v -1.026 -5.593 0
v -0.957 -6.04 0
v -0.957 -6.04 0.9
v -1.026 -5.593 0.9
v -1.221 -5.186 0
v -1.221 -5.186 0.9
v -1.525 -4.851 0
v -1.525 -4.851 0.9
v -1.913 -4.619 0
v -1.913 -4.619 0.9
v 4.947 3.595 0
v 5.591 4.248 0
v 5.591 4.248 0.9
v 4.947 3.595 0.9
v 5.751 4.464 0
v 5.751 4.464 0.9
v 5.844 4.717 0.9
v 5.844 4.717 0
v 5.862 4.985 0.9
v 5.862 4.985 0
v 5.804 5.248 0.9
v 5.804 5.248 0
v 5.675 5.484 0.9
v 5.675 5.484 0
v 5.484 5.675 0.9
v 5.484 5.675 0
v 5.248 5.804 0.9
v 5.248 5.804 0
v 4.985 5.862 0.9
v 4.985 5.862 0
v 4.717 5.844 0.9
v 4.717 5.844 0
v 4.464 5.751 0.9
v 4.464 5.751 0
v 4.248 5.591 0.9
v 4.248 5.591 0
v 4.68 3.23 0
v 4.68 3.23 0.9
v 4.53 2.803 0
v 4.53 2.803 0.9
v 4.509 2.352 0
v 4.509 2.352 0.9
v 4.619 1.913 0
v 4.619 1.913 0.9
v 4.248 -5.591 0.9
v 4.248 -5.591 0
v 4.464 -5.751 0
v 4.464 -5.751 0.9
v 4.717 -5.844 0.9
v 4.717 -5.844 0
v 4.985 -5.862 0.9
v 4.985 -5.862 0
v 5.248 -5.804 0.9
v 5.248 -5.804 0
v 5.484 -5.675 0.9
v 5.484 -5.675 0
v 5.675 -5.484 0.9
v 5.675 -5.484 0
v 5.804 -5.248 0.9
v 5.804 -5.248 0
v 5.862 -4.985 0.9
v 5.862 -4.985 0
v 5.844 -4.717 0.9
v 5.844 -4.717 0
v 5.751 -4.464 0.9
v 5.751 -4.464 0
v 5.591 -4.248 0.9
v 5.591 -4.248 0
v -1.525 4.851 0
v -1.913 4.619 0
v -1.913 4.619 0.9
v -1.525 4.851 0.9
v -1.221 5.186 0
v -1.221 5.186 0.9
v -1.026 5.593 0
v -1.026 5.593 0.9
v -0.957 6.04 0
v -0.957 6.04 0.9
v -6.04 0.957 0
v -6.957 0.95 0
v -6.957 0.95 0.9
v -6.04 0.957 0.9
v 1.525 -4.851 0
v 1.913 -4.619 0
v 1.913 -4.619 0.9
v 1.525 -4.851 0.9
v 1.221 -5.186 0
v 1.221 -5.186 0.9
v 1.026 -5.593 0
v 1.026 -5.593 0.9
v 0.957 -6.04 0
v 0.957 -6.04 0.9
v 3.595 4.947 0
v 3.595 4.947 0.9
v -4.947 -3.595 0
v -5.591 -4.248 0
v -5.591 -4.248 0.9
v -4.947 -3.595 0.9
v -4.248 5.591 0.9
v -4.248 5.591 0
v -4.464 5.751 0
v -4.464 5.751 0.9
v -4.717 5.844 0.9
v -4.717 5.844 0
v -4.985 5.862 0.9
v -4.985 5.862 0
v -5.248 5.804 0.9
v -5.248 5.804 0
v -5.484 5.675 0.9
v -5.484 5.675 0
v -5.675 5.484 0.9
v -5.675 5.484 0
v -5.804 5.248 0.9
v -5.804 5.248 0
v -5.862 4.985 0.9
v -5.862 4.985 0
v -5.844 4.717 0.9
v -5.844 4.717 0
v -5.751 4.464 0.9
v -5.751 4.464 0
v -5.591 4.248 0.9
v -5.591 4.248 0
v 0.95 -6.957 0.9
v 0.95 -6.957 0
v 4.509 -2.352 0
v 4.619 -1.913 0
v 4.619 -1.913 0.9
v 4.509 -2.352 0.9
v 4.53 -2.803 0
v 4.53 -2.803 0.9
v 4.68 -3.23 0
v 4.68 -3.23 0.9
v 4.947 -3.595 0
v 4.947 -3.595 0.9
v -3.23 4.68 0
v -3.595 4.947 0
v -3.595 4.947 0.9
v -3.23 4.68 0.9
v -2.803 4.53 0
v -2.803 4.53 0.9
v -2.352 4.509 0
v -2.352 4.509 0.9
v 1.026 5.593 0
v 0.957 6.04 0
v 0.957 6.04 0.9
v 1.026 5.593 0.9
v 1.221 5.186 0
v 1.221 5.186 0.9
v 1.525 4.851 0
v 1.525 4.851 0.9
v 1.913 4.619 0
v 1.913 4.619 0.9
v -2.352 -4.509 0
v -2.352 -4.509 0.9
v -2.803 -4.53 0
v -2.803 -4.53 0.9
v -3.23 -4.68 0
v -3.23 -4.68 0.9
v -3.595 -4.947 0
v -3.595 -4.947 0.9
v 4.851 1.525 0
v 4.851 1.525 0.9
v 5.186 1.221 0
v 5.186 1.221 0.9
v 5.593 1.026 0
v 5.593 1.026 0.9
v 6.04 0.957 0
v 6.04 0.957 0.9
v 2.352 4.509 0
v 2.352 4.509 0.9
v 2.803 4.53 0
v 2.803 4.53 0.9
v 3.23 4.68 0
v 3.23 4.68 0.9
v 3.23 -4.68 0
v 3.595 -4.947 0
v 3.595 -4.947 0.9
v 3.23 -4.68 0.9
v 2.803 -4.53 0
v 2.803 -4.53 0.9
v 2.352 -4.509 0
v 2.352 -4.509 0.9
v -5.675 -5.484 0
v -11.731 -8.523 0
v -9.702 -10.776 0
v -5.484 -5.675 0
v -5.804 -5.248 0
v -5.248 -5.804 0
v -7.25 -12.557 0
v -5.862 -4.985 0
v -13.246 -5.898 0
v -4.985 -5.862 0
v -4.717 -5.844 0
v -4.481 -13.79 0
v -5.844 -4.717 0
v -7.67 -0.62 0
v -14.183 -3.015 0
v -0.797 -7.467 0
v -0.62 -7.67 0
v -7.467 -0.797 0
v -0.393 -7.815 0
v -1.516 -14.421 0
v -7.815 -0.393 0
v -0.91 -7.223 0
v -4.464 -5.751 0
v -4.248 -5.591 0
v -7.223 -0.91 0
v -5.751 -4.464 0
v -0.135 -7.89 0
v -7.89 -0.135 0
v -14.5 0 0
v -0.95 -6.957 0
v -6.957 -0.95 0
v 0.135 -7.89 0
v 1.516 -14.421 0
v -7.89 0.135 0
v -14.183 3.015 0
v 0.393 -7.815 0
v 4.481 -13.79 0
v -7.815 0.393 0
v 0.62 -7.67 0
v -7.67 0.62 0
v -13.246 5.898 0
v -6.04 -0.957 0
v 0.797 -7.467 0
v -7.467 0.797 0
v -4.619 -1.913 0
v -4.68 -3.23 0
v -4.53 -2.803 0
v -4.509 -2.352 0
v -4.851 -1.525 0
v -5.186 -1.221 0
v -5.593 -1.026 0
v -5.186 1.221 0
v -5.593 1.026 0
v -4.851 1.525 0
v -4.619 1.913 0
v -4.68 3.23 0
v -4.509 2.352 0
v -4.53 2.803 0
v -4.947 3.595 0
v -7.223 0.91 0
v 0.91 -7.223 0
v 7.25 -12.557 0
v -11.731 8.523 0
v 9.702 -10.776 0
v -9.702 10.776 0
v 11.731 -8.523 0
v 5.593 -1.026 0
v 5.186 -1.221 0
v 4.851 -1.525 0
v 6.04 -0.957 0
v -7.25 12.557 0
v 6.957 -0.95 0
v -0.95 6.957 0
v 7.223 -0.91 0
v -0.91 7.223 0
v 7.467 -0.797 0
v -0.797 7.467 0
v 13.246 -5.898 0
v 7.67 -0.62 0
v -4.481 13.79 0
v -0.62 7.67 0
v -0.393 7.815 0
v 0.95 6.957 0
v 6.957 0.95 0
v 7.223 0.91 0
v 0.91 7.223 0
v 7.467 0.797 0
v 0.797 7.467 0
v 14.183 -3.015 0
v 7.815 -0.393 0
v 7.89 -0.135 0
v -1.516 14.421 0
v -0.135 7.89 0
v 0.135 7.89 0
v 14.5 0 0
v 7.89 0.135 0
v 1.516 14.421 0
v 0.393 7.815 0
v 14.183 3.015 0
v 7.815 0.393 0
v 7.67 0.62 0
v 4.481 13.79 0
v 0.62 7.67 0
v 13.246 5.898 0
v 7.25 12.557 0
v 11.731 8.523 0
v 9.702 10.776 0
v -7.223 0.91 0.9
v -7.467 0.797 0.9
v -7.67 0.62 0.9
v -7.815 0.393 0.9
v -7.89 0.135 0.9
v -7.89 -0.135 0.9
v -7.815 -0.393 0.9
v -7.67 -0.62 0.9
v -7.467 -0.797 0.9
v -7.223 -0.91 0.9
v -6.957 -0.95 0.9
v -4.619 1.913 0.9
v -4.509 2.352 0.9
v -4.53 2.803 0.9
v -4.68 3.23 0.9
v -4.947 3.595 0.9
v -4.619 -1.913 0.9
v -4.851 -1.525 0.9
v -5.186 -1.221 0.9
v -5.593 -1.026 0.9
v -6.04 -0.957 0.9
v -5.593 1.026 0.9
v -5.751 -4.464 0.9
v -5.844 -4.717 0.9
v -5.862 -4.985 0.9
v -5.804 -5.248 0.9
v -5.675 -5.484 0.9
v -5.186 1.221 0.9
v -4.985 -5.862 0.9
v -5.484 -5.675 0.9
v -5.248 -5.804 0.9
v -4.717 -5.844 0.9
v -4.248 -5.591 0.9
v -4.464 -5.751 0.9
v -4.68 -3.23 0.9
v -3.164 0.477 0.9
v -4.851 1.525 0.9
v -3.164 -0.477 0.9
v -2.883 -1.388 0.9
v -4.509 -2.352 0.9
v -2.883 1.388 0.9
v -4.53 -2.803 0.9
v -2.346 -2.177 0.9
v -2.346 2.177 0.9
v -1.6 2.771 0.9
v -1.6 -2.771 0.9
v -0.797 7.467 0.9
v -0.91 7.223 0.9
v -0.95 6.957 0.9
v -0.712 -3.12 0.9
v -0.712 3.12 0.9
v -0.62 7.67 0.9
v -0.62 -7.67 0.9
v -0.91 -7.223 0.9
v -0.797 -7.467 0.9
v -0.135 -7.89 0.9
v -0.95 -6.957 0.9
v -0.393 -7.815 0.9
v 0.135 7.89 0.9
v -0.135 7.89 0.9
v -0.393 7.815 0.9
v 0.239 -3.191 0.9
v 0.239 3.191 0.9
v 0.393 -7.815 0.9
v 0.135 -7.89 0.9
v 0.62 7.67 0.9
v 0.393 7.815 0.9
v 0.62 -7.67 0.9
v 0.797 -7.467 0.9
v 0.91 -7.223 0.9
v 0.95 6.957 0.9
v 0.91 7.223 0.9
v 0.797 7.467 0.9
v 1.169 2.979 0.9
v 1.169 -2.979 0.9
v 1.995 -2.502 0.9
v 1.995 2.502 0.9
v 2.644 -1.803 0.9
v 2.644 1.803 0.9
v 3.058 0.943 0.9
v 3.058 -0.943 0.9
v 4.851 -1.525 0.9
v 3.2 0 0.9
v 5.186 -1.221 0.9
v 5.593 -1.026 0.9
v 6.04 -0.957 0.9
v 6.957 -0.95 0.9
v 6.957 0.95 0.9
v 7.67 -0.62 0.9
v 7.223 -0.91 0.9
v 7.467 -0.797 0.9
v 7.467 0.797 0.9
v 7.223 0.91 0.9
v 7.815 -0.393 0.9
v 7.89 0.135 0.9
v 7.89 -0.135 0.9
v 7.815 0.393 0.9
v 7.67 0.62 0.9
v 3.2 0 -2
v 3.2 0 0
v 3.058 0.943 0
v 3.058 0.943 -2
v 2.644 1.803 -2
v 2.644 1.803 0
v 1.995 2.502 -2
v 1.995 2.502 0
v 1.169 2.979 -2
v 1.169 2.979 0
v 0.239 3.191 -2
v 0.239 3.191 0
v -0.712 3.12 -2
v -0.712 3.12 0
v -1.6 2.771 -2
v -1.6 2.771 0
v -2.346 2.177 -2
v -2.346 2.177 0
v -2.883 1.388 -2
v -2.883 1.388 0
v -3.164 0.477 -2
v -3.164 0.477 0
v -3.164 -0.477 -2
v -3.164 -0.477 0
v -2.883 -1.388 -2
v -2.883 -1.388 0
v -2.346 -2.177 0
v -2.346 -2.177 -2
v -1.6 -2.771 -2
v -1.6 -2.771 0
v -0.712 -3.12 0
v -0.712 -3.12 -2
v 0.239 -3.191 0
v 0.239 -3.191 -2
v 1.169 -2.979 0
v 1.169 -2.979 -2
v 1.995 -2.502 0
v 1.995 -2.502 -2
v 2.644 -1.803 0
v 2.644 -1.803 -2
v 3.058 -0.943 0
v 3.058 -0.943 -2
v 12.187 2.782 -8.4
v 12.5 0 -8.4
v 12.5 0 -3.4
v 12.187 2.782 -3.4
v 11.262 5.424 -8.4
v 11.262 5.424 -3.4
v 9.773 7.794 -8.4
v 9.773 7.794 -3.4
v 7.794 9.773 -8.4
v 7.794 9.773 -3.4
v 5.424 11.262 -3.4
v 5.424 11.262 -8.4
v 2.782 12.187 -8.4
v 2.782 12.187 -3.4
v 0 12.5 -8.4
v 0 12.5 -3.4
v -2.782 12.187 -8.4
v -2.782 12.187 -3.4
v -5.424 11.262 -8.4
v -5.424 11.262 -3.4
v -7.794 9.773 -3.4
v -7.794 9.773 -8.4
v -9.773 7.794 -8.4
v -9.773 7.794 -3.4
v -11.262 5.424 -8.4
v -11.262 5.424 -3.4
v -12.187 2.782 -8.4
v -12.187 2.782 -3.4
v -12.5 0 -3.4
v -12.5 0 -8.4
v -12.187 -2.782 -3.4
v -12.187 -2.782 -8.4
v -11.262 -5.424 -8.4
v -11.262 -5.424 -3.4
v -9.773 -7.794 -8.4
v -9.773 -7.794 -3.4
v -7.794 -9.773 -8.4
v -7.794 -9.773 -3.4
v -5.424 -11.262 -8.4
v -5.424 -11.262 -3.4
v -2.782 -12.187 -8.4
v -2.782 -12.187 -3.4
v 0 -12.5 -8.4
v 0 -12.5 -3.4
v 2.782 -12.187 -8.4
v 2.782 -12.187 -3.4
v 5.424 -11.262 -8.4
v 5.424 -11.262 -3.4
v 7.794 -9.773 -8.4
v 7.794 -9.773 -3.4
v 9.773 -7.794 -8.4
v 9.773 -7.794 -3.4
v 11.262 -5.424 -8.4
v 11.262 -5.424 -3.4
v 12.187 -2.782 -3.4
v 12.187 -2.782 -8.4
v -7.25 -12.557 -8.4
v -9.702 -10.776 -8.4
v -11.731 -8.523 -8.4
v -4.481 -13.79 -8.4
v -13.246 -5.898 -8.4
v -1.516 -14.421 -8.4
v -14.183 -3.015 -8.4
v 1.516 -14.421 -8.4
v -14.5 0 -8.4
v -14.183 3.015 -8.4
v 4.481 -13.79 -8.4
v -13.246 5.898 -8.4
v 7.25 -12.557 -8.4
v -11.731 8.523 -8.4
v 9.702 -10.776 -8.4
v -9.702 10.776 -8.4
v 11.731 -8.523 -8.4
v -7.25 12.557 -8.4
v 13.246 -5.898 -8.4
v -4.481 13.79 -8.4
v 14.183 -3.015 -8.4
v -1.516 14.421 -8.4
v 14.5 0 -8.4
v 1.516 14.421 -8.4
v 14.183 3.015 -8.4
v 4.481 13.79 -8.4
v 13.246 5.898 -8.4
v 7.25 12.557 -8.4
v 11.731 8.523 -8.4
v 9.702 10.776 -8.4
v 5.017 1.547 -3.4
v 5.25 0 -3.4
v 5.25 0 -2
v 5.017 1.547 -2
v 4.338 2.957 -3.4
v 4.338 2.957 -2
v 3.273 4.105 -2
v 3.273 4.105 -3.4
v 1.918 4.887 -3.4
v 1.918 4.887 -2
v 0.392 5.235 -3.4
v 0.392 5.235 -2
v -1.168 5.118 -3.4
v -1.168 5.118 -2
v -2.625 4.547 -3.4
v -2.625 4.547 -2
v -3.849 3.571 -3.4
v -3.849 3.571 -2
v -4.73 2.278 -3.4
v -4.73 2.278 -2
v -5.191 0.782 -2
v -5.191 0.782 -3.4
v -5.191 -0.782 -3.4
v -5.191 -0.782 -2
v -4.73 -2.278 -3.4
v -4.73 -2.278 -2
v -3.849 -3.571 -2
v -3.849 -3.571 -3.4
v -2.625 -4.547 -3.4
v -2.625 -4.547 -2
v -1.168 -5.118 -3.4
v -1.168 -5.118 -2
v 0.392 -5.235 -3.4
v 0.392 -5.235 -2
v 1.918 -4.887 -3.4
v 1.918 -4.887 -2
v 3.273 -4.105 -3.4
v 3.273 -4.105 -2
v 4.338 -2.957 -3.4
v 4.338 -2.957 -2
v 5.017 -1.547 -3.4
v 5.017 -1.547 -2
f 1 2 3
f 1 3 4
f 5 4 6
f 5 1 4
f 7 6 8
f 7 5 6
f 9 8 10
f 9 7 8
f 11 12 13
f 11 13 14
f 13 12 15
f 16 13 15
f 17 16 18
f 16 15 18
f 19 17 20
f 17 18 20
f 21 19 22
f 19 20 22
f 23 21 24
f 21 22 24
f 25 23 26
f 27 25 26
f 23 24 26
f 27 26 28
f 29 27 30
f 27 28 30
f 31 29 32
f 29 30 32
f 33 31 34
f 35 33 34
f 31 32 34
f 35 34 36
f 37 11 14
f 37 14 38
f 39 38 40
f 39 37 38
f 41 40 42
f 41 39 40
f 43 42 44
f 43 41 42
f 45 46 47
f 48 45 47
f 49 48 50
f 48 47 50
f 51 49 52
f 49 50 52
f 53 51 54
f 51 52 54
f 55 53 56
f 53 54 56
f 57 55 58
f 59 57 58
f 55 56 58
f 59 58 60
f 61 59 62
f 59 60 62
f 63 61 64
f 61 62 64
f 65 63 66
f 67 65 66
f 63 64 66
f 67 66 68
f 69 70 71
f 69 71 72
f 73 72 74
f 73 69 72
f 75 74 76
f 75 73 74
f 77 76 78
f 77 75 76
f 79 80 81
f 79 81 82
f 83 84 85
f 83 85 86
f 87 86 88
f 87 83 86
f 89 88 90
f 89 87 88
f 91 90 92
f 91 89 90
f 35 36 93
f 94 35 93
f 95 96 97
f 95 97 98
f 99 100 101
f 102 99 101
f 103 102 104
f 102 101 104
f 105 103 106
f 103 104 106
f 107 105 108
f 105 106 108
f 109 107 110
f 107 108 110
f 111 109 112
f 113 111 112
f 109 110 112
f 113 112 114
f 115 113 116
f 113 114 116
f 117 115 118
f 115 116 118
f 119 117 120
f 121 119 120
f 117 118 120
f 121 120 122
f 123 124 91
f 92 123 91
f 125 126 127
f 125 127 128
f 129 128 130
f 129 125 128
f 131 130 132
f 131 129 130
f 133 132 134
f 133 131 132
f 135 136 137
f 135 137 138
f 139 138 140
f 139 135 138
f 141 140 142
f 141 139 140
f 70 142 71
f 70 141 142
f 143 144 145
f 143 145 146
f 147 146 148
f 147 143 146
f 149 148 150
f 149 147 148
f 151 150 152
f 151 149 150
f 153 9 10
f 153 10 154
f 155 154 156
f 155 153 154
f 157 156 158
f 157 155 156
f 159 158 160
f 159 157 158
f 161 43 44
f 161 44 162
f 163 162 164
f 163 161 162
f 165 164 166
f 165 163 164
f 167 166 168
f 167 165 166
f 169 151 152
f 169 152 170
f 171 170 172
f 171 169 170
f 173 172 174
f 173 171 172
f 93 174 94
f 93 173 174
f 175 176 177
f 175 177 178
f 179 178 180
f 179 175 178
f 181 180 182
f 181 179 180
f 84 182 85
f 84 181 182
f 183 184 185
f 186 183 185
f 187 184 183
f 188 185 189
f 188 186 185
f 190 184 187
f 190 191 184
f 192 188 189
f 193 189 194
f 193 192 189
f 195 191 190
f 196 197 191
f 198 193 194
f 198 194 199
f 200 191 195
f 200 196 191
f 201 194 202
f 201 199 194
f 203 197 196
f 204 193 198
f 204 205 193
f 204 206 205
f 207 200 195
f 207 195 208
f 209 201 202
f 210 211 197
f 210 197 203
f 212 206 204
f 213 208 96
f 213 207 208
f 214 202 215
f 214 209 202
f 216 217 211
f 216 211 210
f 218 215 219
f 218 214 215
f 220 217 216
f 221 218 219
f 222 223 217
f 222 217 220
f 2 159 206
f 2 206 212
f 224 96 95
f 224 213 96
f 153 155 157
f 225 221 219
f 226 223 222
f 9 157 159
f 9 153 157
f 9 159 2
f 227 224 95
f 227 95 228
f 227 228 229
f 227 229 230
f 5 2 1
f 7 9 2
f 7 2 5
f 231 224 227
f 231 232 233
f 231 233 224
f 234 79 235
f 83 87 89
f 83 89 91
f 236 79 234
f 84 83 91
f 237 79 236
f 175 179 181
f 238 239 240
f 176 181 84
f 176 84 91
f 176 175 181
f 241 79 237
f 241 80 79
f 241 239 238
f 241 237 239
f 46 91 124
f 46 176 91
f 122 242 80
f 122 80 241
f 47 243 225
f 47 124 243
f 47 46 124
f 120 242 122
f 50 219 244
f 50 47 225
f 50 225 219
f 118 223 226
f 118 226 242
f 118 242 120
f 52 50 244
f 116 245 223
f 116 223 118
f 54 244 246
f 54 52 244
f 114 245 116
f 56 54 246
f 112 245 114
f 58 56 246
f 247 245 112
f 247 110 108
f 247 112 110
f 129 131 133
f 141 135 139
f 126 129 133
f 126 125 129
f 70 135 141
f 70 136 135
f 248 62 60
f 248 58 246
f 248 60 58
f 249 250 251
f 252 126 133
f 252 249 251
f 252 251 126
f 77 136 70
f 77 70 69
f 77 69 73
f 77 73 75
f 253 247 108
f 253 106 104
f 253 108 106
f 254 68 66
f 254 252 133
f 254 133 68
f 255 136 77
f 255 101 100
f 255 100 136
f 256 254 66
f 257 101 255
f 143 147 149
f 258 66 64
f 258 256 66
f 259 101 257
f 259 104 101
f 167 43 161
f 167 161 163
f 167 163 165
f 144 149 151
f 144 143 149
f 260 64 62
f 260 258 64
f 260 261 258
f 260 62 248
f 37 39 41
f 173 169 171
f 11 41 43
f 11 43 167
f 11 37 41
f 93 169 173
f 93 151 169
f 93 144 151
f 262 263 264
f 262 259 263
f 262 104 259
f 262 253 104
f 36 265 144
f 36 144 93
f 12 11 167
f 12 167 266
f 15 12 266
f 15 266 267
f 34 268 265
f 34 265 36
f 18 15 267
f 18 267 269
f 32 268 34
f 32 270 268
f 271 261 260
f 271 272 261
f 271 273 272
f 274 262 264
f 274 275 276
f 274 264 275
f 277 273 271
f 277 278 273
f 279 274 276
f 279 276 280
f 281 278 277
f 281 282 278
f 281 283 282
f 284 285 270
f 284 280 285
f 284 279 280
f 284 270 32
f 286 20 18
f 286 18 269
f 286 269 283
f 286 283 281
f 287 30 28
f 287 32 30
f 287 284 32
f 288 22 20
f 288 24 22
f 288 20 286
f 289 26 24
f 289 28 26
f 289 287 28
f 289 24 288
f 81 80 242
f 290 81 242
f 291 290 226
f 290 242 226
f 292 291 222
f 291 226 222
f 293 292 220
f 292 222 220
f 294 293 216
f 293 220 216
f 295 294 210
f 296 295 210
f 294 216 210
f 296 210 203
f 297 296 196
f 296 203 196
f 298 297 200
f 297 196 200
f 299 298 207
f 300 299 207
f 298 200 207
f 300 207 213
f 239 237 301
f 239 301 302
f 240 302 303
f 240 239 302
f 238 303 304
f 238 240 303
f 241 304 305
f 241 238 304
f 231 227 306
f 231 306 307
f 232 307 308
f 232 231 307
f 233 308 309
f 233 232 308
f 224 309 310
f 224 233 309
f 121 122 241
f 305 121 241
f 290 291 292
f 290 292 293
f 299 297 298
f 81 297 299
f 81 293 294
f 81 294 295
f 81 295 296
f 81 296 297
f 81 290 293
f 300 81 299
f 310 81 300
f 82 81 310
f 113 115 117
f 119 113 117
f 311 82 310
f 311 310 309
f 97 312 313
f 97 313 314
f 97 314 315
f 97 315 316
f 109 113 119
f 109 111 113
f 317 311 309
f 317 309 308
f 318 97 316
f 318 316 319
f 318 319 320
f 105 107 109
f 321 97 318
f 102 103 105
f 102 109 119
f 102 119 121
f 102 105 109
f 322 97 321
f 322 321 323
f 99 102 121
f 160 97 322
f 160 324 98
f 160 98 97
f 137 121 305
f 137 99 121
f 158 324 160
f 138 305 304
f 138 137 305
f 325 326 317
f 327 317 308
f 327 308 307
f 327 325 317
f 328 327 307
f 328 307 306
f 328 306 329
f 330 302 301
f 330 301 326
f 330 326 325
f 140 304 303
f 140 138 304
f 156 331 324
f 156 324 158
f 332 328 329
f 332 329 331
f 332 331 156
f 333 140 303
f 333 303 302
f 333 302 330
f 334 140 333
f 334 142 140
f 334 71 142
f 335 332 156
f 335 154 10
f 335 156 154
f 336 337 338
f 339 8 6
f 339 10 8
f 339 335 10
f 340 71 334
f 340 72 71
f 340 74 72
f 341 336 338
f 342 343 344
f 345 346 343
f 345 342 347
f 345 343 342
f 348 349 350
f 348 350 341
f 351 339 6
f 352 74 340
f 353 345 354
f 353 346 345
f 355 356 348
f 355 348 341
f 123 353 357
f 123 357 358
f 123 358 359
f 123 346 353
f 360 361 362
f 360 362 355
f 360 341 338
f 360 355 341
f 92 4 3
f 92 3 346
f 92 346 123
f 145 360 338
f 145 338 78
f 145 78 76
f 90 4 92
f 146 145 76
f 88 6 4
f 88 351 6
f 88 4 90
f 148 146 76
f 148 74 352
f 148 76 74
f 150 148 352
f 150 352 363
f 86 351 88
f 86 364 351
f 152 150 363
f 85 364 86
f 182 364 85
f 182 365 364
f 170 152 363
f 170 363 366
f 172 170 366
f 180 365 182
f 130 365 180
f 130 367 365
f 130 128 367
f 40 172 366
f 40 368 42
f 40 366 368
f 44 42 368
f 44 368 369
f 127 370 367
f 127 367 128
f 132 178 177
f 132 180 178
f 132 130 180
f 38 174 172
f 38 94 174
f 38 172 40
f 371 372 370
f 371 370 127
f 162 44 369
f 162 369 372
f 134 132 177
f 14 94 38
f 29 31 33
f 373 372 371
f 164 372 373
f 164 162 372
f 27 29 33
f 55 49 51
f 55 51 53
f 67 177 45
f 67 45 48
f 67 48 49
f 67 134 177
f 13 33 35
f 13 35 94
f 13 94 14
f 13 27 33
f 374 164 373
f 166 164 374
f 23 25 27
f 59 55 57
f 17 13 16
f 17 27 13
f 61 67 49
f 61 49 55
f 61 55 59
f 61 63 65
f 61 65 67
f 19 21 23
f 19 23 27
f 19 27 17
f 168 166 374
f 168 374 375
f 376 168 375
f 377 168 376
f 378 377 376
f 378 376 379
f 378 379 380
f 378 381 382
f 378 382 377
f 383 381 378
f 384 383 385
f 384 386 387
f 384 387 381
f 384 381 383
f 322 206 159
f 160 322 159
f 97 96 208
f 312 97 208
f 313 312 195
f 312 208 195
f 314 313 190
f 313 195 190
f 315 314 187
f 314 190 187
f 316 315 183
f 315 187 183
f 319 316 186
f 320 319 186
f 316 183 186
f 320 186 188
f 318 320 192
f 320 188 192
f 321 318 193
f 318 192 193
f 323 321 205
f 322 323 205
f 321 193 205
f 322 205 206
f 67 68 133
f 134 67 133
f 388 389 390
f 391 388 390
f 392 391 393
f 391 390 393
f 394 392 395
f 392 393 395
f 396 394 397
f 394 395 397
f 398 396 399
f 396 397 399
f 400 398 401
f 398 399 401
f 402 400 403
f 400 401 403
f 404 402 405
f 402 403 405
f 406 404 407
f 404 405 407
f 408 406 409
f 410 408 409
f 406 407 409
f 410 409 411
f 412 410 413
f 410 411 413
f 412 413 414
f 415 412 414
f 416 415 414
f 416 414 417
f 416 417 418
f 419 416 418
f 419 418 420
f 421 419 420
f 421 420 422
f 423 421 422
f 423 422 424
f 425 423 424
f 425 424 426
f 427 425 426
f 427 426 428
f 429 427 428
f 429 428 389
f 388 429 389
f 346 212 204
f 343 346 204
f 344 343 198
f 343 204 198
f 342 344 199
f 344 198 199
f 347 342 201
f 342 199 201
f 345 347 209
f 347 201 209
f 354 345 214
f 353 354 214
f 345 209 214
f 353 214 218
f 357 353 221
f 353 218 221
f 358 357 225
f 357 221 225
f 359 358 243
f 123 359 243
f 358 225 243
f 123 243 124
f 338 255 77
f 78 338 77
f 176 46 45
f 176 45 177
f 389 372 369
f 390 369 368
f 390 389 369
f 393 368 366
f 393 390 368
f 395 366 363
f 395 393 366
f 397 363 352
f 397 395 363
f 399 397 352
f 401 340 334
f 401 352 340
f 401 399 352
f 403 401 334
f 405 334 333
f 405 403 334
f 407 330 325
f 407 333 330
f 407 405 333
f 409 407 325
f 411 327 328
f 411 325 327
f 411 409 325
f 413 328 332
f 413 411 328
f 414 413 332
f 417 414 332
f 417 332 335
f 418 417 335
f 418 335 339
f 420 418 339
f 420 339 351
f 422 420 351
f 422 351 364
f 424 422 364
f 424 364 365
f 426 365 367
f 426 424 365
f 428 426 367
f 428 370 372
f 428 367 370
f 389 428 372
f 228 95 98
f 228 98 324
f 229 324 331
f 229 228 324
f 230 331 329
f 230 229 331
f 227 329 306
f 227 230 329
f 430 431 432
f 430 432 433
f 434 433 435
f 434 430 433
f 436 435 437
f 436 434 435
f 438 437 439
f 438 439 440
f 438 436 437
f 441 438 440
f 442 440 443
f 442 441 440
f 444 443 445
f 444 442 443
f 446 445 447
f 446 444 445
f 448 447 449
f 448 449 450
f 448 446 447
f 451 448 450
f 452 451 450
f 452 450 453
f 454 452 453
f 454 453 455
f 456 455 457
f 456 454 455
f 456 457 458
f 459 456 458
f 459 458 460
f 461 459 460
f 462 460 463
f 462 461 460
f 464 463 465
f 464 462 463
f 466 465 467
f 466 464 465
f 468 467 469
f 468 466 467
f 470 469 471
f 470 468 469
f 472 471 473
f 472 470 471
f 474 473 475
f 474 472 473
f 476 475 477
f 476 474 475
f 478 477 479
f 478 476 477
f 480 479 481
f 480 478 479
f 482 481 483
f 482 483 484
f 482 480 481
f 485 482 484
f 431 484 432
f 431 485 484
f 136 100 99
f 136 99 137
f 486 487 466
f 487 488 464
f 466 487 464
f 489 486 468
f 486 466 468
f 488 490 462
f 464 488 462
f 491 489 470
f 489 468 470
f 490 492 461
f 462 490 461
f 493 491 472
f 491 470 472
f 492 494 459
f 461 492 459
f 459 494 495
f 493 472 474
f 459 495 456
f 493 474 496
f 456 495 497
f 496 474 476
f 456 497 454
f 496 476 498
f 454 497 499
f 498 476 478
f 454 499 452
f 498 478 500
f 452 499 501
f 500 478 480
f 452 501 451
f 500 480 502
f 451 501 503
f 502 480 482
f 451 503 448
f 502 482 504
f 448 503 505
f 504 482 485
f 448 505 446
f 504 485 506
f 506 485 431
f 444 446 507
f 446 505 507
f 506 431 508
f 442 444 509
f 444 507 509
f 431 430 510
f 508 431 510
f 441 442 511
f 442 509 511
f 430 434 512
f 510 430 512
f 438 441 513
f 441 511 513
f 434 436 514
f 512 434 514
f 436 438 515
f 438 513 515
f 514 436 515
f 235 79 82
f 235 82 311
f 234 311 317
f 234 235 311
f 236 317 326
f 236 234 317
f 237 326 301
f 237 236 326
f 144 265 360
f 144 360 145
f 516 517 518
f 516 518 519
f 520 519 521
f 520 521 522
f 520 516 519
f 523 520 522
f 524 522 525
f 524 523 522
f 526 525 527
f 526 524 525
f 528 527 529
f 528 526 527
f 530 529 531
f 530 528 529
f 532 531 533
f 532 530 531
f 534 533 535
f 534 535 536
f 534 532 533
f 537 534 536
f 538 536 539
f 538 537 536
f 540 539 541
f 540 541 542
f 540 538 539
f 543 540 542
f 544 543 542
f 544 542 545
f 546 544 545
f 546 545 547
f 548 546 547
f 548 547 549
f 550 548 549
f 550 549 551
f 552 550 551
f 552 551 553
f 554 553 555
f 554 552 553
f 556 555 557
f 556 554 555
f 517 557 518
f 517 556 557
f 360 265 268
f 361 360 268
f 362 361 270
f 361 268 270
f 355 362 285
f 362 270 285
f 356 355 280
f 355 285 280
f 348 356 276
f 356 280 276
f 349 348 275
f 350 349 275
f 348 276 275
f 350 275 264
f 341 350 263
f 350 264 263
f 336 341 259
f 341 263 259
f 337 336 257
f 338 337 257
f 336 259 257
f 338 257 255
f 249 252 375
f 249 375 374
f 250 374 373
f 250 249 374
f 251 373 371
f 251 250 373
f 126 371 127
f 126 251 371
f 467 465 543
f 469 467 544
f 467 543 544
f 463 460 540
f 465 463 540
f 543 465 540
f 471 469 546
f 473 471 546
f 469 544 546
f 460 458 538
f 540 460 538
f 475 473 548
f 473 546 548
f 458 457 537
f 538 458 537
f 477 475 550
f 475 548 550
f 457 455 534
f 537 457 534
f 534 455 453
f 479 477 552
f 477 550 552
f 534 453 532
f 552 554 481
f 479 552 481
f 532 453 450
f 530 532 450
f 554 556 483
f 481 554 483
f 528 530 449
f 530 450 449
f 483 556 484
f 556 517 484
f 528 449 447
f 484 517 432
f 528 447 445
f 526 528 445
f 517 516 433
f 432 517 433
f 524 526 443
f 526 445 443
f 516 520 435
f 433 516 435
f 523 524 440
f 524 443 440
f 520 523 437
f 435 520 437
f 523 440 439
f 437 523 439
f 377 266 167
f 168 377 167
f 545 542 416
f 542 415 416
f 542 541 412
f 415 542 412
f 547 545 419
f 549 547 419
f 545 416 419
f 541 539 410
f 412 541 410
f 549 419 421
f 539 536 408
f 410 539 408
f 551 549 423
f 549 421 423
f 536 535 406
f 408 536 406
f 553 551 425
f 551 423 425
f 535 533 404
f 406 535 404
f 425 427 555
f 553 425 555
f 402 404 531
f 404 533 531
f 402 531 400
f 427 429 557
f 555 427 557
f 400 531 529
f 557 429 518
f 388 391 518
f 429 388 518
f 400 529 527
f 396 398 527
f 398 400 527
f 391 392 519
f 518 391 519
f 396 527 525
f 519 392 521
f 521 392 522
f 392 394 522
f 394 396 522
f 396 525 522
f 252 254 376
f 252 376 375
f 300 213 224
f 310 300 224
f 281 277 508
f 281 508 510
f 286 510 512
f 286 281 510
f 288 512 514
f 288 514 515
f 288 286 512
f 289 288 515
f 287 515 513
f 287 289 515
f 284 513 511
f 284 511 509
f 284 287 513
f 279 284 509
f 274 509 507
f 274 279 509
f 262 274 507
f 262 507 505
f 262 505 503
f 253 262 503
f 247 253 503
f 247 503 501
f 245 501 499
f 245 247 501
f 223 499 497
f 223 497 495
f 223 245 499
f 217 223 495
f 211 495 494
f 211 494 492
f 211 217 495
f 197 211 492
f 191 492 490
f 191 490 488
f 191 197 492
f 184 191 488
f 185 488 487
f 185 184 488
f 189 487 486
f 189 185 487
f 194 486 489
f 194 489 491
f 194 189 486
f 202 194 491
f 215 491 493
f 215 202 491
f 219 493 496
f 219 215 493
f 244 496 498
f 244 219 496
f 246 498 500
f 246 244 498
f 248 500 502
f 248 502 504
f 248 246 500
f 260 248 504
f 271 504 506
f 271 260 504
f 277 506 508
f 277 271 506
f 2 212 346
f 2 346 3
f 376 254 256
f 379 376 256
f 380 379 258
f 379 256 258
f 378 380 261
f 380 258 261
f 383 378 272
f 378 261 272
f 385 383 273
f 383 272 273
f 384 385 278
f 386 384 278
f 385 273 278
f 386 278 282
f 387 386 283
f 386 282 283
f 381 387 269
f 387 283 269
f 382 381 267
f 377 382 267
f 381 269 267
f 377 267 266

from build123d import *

# Parameters (mm, degrees)
SKETCH013_R           = 14.5
PAD005_DEPTH          = 8.4
PAD006_DEPTH          = 0.9
POLARPATTERN006_COUNT = 8
SKETCH023_R           = 12.5
POCKET008_DEPTH       = 5
SKETCH017_R           = 5.25
POCKET006_DEPTH       = 1.4
SKETCH018_R           = 3.2
POCKET007_DEPTH       = 8.401
POCKET007_DEPTH_BACK  = 0.901


with BuildPart() as part:
    # Sketch013 → Pad005 (new body)
    with BuildSketch(Plane.XY):
        Circle(SKETCH013_R)
    extrude(amount=-PAD005_DEPTH)

    # Sketch016 → Pad006 (join)
    with BuildSketch(Plane.XY):
        with BuildLine():
            ThreePointArc((0.9499750638, 6.9568831834), (0, 7.9), (-0.9499750638, 6.9568831834))
            Line((-0.9499750638, 6.9568831834), (-0.9566171674, 6.0401804808))
            ThreePointArc((-1.9134171618, 4.6193976626), (-1.2209267144, 5.1856138051), (-0.9566171674, 6.0401804808))
            Line((-1.9134171618, 4.6193976626), (0, 0))
            Line((0, 0), (1.9134171618, 4.6193976626))
            ThreePointArc((0.9566171674, 6.0401804808), (1.2209267144, 5.1856138051), (1.9134171618, 4.6193976626))
            Line((0.9499750638, 6.9568831834), (0.9566171674, 6.0401804808))
        make_face()
    pad006 = extrude(amount=PAD006_DEPTH)

    # PolarPattern006: Pad006 ×8 about axis
    polarpattern006_axis = Axis((0, 0, 0), (0, 0, 1))
    for i in range(1, POLARPATTERN006_COUNT):
        add(pad006.rotate(polarpattern006_axis, i * 360 / POLARPATTERN006_COUNT))

    # Sketch023 → Pocket008 (cut)
    with BuildSketch(Plane.XY.offset(-8.4)):
        Circle(SKETCH023_R)
    extrude(amount=POCKET008_DEPTH, mode=Mode.SUBTRACT)

    # Sketch017 → Pocket006 (cut)
    with BuildSketch(Plane.XY.offset(-3.4)):
        Circle(SKETCH017_R)
    extrude(amount=POCKET006_DEPTH, mode=Mode.SUBTRACT)

    # Sketch018 → Pocket007 (cut, two sides)
    with BuildSketch(Plane.XY) as pocket007_sk:
        Circle(SKETCH018_R)
    extrude(amount=-POCKET007_DEPTH, mode=Mode.SUBTRACT)
    extrude(pocket007_sk.sketch, amount=POCKET007_DEPTH_BACK, mode=Mode.SUBTRACT)


solid = part.part
